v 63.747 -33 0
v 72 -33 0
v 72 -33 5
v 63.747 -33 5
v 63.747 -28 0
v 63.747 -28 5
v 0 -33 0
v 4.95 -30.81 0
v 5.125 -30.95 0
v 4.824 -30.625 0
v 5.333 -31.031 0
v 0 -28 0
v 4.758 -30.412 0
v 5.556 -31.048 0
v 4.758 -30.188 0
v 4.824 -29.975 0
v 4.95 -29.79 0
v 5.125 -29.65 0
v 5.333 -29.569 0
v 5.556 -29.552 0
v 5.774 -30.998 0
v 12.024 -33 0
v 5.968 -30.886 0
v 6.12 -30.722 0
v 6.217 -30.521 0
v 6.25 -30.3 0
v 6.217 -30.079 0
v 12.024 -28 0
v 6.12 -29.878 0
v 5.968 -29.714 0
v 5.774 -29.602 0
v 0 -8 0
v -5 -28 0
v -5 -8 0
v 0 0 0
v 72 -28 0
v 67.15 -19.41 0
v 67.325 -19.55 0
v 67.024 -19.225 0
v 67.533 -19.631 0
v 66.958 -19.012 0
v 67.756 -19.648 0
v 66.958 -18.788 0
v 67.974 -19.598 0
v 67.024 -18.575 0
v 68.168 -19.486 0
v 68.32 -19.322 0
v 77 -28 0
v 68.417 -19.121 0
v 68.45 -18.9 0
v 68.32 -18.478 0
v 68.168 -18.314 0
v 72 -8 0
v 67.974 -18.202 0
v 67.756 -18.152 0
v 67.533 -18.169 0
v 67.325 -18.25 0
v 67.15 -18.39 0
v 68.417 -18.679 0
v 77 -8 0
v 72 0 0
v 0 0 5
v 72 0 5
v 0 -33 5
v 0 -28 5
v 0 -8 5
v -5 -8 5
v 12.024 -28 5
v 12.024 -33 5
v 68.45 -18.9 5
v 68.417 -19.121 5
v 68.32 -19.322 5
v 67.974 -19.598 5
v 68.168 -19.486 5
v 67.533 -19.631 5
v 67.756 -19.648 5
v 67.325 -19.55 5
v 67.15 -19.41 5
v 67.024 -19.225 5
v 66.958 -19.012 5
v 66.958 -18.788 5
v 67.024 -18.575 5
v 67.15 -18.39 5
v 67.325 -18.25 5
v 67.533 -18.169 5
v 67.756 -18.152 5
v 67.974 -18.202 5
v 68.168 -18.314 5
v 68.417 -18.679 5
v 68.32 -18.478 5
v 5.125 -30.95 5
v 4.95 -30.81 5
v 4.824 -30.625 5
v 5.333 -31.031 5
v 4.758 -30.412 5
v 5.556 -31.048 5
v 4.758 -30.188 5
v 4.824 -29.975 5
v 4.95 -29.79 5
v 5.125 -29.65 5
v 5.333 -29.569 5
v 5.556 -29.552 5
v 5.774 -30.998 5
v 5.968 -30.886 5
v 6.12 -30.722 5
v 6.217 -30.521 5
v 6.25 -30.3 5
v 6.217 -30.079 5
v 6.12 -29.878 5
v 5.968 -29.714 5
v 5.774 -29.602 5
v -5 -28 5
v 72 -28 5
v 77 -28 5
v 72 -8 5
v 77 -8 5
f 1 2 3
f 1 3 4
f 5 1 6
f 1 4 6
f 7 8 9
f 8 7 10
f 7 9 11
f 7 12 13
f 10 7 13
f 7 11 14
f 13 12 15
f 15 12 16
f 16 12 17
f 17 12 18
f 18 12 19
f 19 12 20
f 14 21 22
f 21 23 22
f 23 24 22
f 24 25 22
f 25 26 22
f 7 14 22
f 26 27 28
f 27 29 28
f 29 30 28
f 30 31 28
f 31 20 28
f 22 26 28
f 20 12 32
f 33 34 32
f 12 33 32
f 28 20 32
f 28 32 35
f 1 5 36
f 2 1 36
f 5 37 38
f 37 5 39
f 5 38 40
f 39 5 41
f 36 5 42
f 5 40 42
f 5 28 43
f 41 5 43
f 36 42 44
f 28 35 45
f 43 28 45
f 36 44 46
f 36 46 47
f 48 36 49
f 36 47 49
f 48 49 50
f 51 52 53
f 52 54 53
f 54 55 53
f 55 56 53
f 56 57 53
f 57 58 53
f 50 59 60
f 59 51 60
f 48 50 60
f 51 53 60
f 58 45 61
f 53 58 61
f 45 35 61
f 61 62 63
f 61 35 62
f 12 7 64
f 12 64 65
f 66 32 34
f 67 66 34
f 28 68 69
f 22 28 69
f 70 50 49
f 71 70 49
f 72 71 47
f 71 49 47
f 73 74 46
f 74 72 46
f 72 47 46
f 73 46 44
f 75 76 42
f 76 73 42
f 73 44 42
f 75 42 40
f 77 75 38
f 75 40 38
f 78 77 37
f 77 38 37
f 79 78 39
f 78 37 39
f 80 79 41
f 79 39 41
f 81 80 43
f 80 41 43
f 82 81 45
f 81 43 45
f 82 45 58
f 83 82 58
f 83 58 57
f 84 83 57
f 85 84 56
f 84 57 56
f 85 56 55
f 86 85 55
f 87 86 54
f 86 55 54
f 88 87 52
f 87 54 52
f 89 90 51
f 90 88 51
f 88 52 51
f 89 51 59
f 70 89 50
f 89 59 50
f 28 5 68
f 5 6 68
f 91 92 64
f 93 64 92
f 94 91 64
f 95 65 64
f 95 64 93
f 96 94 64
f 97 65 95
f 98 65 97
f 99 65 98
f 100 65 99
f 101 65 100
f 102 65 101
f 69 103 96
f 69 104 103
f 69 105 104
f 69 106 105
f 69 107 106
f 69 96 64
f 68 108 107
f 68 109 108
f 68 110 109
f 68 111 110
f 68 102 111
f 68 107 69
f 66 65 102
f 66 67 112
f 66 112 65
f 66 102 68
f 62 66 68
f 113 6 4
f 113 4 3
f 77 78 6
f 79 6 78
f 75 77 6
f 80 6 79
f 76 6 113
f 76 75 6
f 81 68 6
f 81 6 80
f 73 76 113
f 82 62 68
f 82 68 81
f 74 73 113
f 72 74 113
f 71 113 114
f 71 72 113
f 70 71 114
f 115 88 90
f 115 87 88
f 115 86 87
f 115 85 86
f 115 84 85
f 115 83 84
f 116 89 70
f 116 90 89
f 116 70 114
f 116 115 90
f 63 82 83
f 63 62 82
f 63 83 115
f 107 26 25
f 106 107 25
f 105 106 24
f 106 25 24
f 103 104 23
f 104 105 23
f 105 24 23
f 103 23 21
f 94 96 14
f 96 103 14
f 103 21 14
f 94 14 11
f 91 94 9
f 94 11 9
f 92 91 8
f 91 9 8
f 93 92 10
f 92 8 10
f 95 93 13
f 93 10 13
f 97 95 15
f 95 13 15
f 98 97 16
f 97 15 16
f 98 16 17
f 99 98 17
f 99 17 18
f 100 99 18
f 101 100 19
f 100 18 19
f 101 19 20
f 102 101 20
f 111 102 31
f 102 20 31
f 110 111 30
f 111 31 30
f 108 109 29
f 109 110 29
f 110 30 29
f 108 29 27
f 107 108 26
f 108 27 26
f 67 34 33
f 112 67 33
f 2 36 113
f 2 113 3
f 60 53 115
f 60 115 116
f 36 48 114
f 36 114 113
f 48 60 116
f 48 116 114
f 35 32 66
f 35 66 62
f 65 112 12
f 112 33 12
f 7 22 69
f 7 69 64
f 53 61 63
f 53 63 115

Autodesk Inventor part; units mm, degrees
ref_plane "YZ Plane" through (0, 0, 0) normal (1, 0, 0) x (0, 1, 0)
ref_plane "XZ Plane" through (0, 0, 0) normal (0, 1, 0) x (-1, 0, 0)
ref_plane "XY Plane" through (0, 0, 0) normal (0, 0, 1) x (1, 0, 0)
sketch "草图1" plane through (0, 0, 0) normal (0, 0, 1) x (1, 0, 0)
  line L0 (0, 0) -> (72, 0)
  line L1 (72, 0) -> (72, -33)
  line L2 (72, -33) -> (0, -33)
  line L3 (0, -33) -> (0, 0)
  line L4 (36, 26.4753) -> (36, -41.1536) construction
  line L5 (0.9, -33) -> (71.1, -33) construction
  line L6 (71.1, -33) -> (71.1, 0) construction
  line L7 (71.1, 0) -> (0.9, 0) construction
  line L8 (0.9, 0) -> (0.9, -33) construction
  line L9 (0.9, -33) -> (71.1, 0) construction
  line L10 (71.1, -33) -> (0.9, 0) construction
  circle A0 centre (5.5, -18.9) radius 1 construction
  circle A1 centre (67.7, -18.9) radius 0.75
  circle A2 centre (5.5, -30.3) radius 0.75
  line L11 (0, -8) -> (-5, -8)
  line L12 (-5, -8) -> (-5, -28)
  line L13 (-5, -28) -> (0, -28)
  line L14 (0, -28) -> (0, -8)
  line L15 (72, -8) -> (77, -8)
  line L16 (77, -8) -> (77, -28)
  line L17 (77, -28) -> (72, -28)
  line L18 (72, -28) -> (72, -8)
  point P0 (36, -16.5)
  dimension "d0" = 72
  dimension "d1" = 70.2
  dimension "d2" = 33
  dimension "d3" = 0
  dimension "d4" = 0
  dimension "d5" = 2
  dimension "d6" = 18.9
  dimension "d7" = 4.6
  dimension "d8" = 1.5
  dimension "d9" = 62.2
  dimension "d10" = 1.5
  dimension "d11" = 11.4
  dimension "d12" = 5
  dimension "d13" = 20
  dimension "d14" = 5
  dimension "d15" = 5
  dimension "d16" = 20
  dimension "d17" = 5
extrude "拉伸1" add sketch "草图1" along normal blind 5
sketch "草图2" plane through (0, 0, 5) normal (0, 0, 1) x (1, 0, 0)
  circle A0 centre (67.7, -18.9) radius 0.75 projected
  line L0 (0, -33) -> (72, -33) projected
  line L1 (72, -33) -> (72, -28) projected
  line L2 (-25.3854, -5.8) -> (85.4297, -5.8) construction
  line L3 (12.0239, -33) -> (63.7473, -33)
  line L4 (63.7473, -33) -> (63.7473, -28)
  line L5 (63.7473, -28) -> (12.0239, -28)
  line L6 (12.0239, -28) -> (12.0239, -33)
  dimension "d20" = 13.1
extrude "拉伸2" cut sketch "草图2" against normal through all contours L6 L5 L4 L0
properties part number "print-head-fix"
